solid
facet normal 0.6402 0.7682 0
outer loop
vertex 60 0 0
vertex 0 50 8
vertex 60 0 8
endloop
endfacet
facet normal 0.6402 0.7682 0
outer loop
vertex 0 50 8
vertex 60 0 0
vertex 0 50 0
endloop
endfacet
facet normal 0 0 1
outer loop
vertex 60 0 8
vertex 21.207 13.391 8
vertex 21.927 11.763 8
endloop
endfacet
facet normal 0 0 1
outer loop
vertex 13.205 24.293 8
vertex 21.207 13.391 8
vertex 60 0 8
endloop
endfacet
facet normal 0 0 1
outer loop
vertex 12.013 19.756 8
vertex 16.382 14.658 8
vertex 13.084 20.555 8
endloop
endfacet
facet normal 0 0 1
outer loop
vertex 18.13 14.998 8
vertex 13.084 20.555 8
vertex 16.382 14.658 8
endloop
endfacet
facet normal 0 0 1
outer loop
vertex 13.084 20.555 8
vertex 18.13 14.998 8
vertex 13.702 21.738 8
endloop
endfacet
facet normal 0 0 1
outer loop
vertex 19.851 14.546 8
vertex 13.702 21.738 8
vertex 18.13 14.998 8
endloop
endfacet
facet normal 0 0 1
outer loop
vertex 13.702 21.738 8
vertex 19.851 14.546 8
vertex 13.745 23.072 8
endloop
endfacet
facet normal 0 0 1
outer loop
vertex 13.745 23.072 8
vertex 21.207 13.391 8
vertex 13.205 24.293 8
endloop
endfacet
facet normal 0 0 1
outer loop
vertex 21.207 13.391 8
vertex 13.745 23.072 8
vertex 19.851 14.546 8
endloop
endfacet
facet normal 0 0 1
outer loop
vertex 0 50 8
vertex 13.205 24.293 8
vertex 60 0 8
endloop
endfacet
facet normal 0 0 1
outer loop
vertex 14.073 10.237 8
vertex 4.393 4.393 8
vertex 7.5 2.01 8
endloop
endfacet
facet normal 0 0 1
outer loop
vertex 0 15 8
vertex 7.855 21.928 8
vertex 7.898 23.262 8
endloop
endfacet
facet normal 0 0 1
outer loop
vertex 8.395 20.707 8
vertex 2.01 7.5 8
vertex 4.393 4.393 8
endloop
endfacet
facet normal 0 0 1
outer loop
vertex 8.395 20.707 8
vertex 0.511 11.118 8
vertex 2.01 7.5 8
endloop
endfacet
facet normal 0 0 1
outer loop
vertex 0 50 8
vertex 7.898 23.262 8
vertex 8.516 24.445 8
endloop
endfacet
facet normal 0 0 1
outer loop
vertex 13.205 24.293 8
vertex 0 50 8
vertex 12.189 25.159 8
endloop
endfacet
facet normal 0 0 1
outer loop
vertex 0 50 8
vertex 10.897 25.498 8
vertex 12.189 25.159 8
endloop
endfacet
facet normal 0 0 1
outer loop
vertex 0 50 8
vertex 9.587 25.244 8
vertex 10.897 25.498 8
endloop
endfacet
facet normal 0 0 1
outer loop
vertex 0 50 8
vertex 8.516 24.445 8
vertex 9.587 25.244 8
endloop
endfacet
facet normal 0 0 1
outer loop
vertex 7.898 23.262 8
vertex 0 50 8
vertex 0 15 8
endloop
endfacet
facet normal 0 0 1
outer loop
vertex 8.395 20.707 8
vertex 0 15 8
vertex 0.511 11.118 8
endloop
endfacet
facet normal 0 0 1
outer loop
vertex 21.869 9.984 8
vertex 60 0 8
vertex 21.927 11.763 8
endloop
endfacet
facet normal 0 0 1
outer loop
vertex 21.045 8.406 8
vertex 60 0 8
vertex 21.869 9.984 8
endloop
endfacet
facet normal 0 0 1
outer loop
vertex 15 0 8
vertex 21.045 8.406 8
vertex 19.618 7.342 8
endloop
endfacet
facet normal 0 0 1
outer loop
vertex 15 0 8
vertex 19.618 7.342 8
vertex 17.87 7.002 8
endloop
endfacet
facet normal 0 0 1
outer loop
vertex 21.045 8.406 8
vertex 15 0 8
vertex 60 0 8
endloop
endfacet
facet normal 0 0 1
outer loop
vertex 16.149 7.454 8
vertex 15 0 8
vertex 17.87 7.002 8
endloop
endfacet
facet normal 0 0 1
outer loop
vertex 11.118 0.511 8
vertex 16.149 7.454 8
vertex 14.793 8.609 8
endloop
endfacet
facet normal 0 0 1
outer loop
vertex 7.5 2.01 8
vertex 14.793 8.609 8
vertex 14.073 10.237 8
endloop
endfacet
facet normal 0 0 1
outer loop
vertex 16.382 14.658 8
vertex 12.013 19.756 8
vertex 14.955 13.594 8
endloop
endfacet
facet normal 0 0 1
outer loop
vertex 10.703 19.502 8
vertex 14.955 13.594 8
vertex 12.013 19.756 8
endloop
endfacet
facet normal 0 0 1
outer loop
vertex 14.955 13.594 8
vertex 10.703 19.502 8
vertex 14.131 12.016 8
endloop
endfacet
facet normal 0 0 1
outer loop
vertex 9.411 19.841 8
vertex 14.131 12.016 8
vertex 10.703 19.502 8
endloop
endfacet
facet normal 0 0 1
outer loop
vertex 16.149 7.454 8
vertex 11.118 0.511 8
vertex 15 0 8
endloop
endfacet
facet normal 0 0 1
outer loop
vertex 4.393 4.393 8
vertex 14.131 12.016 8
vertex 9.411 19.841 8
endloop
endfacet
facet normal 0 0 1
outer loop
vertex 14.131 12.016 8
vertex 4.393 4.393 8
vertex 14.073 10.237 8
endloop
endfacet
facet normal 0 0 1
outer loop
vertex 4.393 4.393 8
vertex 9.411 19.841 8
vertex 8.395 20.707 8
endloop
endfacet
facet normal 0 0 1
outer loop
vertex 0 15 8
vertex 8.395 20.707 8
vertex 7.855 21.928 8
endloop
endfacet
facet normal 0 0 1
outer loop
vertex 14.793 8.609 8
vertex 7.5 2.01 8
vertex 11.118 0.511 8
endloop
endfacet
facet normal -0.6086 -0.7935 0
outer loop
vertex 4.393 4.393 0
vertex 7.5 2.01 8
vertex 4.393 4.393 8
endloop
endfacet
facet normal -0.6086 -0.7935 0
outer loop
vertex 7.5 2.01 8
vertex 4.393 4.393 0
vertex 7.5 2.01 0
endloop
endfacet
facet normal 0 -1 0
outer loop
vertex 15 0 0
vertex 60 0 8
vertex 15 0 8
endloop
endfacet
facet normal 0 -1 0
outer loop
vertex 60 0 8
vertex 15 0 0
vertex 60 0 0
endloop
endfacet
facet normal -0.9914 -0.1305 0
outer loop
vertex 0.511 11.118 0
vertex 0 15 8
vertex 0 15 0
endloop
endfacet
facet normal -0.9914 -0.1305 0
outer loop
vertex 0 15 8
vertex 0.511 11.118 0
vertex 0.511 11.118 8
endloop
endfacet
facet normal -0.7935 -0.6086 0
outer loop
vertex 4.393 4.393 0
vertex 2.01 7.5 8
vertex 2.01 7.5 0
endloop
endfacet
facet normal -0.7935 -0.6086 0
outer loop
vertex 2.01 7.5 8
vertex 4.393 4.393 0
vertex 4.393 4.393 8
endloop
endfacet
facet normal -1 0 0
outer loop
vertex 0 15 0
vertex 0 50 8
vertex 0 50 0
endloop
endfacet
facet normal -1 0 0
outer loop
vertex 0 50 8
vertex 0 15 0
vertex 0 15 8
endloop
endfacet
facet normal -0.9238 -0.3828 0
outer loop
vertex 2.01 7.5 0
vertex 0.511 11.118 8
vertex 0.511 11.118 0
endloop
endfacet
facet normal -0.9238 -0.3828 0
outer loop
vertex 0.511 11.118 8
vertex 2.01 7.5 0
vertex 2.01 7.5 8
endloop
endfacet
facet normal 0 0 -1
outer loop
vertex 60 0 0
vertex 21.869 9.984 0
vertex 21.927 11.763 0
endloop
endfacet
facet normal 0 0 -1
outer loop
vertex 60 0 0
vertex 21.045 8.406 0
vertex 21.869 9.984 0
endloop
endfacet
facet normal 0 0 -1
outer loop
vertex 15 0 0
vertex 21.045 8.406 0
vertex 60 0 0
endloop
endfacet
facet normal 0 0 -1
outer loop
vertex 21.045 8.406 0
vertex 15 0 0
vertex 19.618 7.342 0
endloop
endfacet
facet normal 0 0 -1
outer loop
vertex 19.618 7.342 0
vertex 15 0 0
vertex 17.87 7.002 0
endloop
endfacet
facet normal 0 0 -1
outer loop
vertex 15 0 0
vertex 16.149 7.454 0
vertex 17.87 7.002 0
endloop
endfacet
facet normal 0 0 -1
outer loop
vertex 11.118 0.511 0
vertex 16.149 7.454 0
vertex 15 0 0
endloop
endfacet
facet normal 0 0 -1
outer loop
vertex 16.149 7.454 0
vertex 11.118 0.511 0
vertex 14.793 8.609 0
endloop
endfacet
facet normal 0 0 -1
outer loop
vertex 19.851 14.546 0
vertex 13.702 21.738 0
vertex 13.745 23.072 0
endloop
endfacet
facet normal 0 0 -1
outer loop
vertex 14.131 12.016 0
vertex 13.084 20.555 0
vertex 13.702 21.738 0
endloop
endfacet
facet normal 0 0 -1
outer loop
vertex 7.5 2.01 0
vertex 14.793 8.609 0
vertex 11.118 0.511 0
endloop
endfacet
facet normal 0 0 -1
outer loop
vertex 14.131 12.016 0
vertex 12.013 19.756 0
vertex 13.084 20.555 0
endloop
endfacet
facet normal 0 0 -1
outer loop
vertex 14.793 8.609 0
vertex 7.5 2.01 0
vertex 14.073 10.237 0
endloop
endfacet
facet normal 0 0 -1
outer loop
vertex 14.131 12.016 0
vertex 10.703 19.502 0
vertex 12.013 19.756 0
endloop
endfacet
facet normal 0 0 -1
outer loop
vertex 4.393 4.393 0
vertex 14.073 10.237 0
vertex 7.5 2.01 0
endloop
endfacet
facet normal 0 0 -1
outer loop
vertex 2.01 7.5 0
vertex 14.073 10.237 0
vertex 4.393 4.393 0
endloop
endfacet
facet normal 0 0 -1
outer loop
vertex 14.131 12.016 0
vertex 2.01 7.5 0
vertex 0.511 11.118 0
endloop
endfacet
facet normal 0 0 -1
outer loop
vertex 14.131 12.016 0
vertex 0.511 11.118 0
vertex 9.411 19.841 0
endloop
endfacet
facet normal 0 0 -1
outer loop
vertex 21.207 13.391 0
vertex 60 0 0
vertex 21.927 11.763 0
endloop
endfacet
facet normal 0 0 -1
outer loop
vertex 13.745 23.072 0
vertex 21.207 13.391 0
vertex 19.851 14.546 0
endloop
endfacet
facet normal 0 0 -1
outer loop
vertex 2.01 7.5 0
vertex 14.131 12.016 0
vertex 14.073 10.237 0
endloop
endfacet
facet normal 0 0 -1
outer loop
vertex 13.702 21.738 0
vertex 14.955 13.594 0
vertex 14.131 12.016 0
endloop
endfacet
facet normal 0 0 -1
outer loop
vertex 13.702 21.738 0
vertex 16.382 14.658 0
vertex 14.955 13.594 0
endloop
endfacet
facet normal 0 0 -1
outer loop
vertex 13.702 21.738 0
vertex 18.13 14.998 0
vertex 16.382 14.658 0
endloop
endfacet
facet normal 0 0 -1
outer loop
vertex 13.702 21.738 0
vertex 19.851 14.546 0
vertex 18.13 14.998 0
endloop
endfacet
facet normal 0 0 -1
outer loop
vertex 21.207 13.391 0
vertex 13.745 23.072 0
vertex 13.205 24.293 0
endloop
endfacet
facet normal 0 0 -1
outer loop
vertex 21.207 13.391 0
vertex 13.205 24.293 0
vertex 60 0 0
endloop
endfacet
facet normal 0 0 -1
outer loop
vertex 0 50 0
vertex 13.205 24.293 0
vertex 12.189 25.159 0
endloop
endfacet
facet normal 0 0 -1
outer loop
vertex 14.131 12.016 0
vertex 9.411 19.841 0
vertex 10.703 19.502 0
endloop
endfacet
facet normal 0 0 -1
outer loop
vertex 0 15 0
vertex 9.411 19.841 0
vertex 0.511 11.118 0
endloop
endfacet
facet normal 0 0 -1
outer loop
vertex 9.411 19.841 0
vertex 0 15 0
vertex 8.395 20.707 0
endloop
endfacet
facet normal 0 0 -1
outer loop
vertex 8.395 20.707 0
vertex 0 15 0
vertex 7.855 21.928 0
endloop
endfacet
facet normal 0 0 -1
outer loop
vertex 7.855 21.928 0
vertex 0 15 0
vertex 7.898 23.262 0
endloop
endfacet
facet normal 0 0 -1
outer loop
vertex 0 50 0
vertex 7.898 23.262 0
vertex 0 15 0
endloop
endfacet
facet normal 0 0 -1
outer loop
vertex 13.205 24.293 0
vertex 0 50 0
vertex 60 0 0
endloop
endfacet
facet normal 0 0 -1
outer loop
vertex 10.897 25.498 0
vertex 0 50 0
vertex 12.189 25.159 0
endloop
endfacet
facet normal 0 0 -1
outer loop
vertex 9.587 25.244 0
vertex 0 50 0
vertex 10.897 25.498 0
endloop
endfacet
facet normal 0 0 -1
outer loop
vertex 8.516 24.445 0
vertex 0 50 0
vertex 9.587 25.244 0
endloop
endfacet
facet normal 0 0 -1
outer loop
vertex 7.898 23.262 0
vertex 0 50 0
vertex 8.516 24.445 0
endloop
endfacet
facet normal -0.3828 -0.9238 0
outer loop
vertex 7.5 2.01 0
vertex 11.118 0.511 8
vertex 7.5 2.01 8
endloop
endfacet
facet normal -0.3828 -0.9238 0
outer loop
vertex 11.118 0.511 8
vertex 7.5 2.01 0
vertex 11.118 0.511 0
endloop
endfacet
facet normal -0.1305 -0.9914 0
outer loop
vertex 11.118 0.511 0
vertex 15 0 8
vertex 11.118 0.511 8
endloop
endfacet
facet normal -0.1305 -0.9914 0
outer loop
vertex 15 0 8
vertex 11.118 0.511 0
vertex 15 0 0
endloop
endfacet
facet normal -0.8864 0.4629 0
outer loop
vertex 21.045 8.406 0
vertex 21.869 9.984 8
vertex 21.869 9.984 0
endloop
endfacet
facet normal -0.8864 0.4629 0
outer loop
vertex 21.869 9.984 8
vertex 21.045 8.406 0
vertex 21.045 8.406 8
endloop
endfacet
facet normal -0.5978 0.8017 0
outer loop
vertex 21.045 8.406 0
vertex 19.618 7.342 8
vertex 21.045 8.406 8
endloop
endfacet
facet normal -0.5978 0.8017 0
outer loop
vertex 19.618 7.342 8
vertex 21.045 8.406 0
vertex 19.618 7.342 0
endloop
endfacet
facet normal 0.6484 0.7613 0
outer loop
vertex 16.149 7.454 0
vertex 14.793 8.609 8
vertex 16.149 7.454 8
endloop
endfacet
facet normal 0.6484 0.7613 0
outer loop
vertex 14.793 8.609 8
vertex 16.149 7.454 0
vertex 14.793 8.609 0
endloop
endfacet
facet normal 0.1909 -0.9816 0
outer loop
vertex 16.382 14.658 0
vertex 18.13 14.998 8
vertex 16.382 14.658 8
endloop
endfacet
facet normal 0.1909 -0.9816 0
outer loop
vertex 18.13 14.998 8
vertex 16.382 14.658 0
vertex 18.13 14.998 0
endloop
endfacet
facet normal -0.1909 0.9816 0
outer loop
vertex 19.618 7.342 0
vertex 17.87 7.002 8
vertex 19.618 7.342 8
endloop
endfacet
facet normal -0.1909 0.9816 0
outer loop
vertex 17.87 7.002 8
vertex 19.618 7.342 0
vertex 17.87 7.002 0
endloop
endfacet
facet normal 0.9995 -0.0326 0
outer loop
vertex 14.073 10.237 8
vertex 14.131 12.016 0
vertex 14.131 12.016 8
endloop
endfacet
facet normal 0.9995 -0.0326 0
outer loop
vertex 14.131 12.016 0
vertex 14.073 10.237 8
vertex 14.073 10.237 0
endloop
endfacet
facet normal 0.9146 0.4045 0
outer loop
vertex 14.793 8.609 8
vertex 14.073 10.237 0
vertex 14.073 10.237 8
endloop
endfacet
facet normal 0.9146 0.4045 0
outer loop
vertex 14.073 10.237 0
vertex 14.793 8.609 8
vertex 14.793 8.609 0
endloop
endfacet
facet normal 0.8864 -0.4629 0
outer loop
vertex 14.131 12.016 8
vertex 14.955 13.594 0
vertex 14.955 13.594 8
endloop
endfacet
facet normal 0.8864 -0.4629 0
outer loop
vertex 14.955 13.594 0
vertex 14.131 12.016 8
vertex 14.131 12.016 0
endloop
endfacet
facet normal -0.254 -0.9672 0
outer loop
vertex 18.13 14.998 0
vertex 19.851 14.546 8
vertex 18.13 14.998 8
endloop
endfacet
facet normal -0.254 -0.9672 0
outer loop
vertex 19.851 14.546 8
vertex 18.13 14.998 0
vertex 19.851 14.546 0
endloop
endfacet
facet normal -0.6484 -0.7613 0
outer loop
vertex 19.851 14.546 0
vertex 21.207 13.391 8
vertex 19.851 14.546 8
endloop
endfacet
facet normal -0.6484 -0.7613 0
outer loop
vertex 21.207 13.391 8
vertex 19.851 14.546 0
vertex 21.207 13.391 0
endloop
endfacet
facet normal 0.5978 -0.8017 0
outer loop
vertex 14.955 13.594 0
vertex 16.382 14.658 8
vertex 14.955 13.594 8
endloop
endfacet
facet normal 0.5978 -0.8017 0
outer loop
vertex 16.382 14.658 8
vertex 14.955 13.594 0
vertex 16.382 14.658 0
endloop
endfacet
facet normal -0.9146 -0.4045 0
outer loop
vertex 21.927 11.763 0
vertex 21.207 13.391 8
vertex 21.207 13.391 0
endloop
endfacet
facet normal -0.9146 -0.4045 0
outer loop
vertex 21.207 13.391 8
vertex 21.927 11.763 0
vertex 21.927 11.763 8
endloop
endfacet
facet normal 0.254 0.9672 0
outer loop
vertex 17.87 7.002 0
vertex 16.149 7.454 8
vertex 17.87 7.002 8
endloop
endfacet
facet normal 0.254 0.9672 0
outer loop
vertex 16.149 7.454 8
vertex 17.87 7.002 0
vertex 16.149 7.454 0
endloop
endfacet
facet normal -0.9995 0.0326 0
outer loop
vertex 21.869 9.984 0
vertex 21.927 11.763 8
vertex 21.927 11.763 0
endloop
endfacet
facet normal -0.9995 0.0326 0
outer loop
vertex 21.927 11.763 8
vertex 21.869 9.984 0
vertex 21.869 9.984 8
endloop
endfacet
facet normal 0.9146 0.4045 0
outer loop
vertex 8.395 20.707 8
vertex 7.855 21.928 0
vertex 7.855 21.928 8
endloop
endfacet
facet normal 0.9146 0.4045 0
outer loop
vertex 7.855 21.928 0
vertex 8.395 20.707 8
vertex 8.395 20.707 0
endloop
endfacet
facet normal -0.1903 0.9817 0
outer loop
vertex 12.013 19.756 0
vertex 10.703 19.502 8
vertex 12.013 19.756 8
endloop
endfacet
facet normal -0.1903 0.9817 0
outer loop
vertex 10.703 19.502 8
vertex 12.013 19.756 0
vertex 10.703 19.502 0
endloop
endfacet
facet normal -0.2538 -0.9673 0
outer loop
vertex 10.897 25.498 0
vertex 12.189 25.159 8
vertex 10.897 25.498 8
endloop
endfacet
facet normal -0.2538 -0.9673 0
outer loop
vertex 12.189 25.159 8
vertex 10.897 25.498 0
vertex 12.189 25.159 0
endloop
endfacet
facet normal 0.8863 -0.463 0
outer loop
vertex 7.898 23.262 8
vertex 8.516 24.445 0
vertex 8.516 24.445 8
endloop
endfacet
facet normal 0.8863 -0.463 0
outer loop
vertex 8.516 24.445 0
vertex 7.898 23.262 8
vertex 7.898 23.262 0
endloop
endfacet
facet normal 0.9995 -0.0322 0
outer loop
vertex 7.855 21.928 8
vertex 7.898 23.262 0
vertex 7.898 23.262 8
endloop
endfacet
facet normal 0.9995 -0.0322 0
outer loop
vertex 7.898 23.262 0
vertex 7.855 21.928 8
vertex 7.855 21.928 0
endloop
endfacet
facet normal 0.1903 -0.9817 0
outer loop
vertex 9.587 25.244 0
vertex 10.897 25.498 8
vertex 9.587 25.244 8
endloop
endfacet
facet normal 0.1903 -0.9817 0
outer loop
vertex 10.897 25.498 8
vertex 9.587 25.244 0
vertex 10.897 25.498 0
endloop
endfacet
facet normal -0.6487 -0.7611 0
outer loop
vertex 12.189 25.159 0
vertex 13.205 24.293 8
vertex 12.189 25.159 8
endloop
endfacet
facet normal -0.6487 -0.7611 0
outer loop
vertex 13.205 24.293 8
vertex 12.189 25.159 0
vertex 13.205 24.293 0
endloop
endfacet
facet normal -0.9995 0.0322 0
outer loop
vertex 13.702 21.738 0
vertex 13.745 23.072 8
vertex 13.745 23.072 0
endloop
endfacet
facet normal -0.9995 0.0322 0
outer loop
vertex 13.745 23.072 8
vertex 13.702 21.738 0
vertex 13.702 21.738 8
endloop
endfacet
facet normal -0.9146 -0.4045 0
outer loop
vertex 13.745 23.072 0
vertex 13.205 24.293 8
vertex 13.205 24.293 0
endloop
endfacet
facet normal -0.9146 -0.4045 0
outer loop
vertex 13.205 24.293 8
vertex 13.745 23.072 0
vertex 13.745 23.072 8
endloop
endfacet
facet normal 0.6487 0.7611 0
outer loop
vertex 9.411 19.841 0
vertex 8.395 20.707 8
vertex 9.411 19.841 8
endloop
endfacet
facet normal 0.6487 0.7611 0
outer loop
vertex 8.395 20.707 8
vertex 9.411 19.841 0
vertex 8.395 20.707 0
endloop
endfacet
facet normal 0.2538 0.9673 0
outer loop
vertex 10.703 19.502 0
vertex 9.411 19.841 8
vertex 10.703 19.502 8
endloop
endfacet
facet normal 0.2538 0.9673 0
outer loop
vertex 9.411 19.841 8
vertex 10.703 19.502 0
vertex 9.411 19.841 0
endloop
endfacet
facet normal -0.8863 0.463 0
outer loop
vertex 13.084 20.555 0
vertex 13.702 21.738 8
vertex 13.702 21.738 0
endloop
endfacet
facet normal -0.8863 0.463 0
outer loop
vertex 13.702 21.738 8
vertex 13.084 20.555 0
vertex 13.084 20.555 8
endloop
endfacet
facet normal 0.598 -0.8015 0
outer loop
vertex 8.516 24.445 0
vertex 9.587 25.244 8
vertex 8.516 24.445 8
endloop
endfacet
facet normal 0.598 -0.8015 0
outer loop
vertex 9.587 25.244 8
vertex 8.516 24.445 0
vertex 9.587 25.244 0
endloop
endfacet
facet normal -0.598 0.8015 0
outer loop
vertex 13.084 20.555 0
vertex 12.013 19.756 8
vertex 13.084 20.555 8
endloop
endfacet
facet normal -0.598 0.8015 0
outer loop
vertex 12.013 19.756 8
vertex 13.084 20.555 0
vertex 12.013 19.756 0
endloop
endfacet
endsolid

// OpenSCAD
$fn = 32;

// ----------------------------------------------------------------------
// Bracket plate: corner pad 60 x 50, fillet R15
// ----------------------------------------------------------------------

// --- parameters (mm) ---
hole_r = 3;               // bolt hole radius
plate_t = 8;              // plate thickness, Z (extrusion height)
leg_a = 60;               // base leg
leg_b = 50;               // height leg
fillet_r = 15;            // right-angle fillet radius

hole_d1 = 2 * hole_r + 2;
hole_d2 = 2 * hole_r;

profile = [[15, 0], [60, 0], [0, 50], [0, 15], [0.511, 11.118], [2.01, 7.5], [4.393, 4.393], [7.5, 2.01], [11.118, 0.511]];  // primary outline, 9 points, counter clockwise
void_1 = [[21.927, 11.763], [21.207, 13.391], [19.851, 14.546], [18.13, 14.998], [16.382, 14.658], [14.955, 13.594], [14.131, 12.016], [14.073, 10.237], [14.793, 8.609], [16.149, 7.454], [17.87, 7.002], [19.618, 7.342], [21.045, 8.406], [21.869, 9.984]];  // mount hole 1, 14 points
void_2 = [[13.745, 23.072], [13.205, 24.293], [12.189, 25.159], [10.897, 25.498], [9.587, 25.244], [8.516, 24.445], [7.898, 23.262], [7.855, 21.928], [8.395, 20.707], [9.411, 19.841], [10.703, 19.502], [12.013, 19.756], [13.084, 20.555], [13.702, 21.738]];  // mount hole 2, 14 points

// --- the one profile operation ---
difference() {
  linear_extrude(height = plate_t) polygon(points = profile);
  translate([0, 0, -1])
    linear_extrude(height = plate_t + 2) polygon(points = void_1);
  translate([0, 0, -1])
    linear_extrude(height = plate_t + 2) polygon(points = void_2);
}
